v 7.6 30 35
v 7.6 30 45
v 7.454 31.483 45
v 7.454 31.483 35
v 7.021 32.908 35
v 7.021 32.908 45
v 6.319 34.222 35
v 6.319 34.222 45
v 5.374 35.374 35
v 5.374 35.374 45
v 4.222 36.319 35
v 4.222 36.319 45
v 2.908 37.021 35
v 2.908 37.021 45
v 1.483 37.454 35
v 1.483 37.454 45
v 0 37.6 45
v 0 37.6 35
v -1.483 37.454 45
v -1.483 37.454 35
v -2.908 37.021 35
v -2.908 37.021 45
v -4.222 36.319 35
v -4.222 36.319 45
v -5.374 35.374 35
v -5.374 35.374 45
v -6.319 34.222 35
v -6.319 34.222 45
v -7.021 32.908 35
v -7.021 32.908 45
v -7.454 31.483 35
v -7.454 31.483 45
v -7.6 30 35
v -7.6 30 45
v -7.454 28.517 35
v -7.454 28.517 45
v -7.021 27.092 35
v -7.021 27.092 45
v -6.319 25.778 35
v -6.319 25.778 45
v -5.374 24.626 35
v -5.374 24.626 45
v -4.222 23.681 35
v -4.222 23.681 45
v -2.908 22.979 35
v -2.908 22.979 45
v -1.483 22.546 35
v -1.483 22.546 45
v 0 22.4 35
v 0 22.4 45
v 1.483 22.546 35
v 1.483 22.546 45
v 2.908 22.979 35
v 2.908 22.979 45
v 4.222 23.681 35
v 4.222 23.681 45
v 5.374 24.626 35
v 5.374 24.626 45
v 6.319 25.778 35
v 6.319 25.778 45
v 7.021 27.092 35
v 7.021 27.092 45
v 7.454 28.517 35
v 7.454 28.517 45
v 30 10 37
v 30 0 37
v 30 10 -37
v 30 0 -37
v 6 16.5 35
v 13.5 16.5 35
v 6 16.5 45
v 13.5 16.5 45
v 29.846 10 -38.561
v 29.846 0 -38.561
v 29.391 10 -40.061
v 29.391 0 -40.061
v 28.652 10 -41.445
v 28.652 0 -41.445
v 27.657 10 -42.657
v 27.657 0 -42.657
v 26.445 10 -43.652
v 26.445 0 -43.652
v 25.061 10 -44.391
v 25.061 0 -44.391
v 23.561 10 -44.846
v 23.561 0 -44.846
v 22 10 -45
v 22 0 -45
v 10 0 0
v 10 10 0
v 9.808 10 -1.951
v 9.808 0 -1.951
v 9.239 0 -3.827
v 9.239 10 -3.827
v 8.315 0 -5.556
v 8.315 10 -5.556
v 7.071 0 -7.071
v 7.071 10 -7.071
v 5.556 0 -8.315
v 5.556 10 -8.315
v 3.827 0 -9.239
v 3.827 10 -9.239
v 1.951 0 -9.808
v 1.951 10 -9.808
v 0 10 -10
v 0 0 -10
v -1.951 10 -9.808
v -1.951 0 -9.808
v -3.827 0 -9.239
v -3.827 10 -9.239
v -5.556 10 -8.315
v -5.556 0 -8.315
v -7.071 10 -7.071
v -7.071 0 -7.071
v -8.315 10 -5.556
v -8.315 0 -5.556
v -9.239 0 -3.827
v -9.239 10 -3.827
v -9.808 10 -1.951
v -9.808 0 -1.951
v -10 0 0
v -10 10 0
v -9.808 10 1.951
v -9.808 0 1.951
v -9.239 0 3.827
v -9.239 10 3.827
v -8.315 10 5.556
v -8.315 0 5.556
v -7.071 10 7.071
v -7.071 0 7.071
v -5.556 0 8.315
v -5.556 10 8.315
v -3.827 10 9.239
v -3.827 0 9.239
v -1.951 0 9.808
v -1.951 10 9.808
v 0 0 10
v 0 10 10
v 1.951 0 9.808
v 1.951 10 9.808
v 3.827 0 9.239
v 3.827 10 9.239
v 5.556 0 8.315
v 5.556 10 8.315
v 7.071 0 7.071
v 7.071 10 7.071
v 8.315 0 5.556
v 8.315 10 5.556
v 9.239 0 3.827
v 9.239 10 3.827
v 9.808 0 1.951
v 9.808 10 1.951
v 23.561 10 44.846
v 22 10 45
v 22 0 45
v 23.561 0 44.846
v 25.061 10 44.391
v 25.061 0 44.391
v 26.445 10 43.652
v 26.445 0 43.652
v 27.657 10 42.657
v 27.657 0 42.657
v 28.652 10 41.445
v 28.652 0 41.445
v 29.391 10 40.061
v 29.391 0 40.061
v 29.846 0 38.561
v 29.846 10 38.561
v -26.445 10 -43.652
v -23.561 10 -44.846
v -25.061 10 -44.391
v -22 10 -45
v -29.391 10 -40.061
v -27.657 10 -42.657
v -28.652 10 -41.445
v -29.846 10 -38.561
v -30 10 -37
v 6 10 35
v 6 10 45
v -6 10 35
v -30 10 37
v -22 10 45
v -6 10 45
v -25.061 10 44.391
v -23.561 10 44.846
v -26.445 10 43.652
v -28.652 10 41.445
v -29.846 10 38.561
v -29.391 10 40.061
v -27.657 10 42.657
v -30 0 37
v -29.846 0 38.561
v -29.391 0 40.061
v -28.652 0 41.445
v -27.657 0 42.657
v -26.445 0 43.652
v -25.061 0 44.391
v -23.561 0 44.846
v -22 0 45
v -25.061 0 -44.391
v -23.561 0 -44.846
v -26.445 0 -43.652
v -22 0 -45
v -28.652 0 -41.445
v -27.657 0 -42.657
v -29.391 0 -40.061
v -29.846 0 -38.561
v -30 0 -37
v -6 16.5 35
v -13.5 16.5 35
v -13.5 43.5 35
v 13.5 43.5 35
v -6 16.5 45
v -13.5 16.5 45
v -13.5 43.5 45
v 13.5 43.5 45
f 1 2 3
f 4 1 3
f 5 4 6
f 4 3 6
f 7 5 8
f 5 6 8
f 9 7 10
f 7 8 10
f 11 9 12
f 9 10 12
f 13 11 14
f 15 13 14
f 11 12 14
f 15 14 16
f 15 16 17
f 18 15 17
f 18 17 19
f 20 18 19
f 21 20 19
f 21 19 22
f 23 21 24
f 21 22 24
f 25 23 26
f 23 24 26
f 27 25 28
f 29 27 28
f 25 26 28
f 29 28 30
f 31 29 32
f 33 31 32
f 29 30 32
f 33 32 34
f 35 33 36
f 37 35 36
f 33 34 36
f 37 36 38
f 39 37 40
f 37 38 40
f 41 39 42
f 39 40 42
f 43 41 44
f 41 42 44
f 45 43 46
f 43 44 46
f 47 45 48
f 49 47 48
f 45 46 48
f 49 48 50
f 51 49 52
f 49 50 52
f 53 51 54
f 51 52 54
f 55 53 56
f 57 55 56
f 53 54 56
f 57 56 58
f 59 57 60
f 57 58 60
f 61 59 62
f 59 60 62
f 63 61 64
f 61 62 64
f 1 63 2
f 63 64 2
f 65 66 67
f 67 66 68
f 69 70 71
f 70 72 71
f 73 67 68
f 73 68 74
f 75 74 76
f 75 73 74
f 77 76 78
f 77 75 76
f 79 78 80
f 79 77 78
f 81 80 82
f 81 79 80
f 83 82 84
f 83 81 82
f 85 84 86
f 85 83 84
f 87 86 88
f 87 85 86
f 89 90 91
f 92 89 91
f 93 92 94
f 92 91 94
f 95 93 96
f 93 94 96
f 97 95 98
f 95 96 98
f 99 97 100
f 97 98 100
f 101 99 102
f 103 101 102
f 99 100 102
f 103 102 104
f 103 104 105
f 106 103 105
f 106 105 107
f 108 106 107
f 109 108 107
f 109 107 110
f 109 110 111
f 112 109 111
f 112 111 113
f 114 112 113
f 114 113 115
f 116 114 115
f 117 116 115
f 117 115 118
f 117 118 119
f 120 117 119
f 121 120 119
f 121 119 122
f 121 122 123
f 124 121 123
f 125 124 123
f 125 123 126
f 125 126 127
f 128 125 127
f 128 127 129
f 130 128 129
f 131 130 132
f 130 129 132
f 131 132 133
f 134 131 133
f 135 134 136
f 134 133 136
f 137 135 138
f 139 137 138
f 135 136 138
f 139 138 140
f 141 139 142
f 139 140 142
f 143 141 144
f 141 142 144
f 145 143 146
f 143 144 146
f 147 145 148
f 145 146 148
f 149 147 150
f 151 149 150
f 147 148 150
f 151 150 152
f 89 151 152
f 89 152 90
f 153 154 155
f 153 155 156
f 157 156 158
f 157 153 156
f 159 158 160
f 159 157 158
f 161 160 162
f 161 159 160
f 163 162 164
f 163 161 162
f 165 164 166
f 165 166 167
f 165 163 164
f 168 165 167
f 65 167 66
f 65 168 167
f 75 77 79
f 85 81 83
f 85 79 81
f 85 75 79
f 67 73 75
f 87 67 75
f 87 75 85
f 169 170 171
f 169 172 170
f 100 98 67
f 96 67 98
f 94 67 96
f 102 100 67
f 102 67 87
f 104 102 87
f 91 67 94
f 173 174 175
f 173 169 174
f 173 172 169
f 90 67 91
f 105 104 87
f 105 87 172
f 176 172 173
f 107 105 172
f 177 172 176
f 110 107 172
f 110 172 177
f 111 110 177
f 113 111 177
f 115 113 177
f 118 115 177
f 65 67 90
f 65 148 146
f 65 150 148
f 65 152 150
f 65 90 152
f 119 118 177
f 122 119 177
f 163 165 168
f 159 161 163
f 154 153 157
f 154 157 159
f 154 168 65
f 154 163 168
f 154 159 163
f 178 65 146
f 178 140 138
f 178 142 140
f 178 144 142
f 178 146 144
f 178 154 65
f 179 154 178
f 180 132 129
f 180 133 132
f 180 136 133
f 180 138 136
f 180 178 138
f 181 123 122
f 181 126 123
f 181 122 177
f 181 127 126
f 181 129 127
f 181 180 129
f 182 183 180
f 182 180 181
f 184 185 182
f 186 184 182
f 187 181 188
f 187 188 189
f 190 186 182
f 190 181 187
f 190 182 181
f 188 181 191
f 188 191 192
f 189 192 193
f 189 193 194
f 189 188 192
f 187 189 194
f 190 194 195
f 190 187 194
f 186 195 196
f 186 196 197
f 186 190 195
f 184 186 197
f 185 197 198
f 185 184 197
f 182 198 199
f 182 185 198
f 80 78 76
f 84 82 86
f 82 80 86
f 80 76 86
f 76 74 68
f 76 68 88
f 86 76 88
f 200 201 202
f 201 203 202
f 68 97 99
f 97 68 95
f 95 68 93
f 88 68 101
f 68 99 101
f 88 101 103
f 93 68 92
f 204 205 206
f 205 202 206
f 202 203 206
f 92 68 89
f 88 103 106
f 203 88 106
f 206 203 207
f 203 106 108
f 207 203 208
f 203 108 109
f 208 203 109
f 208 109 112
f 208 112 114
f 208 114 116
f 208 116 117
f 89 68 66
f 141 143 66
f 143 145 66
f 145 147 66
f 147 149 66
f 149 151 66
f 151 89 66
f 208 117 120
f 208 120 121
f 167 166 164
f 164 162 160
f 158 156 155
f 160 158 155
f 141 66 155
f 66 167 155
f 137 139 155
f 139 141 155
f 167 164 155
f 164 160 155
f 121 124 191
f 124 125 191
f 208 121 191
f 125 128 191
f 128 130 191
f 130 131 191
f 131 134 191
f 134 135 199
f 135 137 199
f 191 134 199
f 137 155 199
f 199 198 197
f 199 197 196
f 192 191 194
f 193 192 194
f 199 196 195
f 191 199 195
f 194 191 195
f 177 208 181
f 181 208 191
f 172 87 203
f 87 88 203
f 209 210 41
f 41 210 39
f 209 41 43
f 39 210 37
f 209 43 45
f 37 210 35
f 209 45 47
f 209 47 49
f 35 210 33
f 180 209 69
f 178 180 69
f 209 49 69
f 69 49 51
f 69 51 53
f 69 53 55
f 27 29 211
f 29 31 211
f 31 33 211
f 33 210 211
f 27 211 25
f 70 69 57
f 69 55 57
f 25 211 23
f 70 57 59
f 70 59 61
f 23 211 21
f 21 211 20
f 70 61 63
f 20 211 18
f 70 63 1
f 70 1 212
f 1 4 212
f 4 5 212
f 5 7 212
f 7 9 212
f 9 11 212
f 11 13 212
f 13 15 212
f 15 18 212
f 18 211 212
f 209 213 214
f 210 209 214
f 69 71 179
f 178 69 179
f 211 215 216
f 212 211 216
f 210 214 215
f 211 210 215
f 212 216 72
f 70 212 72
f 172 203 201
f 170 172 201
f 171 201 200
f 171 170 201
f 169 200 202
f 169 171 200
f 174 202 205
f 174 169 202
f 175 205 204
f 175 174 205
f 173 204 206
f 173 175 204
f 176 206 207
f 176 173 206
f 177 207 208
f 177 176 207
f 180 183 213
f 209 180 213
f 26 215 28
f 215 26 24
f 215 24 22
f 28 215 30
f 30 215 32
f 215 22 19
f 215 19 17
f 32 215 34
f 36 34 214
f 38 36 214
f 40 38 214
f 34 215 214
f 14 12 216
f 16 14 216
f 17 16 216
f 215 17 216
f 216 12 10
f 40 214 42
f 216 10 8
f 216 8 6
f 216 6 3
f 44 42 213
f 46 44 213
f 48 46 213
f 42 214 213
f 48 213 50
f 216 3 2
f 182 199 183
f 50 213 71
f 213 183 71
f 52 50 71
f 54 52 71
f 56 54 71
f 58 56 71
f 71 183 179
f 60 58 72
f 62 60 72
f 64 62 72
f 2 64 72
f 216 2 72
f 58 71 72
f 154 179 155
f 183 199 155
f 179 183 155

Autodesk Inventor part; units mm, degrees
ref_plane "YZ Plane" through (0, 0, 0) normal (1, 0, 0) x (0, 1, 0)
ref_plane "XZ Plane" through (0, 0, 0) normal (0, 1, 0) x (-1, 0, 0)
sketch "Sketch1" plane through (0, 0, 0) normal (0, 1, 0) x (-1, 0, 0)
  line L0 (30, 45) -> (-30, 45)
  line L1 (-30, 45) -> (-30, -45)
  line L2 (-30, -45) -> (30, -45)
  line L3 (30, -45) -> (30, 45)
  line L4 (30, 45) -> (-30, -45) construction
  line L5 (-30, 45) -> (30, -45) construction
  point P0 (0, 0)
  dimension "d0" = 60
  dimension "d1" = 90
extrude "Extrusion1" add sketch "Sketch1" along normal blind 10
ref_plane "Work Plane1" through (0, 0, 45) normal (0, 0, 1) x (1, 0, 0)
sketch "Sketch4" plane through (0, 0, 45) normal (0, 0, 1) x (1, 0, 0)
  line L0 (-30, 10) -> (30, 10) projected
  line L1 (0, 10) -> (0, 30)
  line L2 (-5, 10) -> (5, 10)
  circle A0 centre (0, 30) radius 7.6
  line L3 (-13.5, 43.5) -> (13.5, 43.5)
  line L4 (13.5, 43.5) -> (13.5, 16.5)
  line L5 (13.5, 16.5) -> (-13.5, 16.5)
  line L6 (-13.5, 16.5) -> (-13.5, 43.5)
  line L7 (-13.5, 43.5) -> (13.5, 16.5) construction
  line L8 (13.5, 43.5) -> (-13.5, 16.5) construction
  line L9 (-6, 18) -> (6, 18)
  line L10 (6, 18) -> (6, 2)
  line L11 (6, 2) -> (-6, 2)
  line L12 (-6, 2) -> (-6, 18)
  line L13 (-6, 18) -> (6, 2) construction
  line L14 (6, 18) -> (-6, 2) construction
  point P0 (0, 0)
  point P1 (6, 16.5)
  point P2 (-6, 16.5)
  dimension "d11" = 20
  dimension "d27" = 15.2
  dimension "d28" = 27
  dimension "d29" = 27
  dimension "d30" = 12
  dimension "d31" = 16
extrude "Extrusion3" add sketch "Sketch4" against normal blind 10
fillet "Fillet2" radius 8 4 edges at (-30, 5, 45) (30, 5, 45) (30, 5, -45) (-30, 5, -45)
sketch "Sketch5" plane through (0, 10, 0) normal (0, 1, 0) x (1, 0, 0)
  circle A0 centre (0, 0) radius 10
  dimension "d20" = 20
extrude "Extrusion4" cut sketch "Sketch5" against normal blind 10
sketch "Sketch6" plane through (0, 0, 45) normal (0, 0, 1) x (1, 0, 0)
  point P0 (0, 0)
sketch "Sketch7" plane through (0, 0, 45) normal (0, 0, 1) x (1, 0, 0)
  point P0 (0, 0)
properties part number "BASE DE YUGO ESCOCES"
